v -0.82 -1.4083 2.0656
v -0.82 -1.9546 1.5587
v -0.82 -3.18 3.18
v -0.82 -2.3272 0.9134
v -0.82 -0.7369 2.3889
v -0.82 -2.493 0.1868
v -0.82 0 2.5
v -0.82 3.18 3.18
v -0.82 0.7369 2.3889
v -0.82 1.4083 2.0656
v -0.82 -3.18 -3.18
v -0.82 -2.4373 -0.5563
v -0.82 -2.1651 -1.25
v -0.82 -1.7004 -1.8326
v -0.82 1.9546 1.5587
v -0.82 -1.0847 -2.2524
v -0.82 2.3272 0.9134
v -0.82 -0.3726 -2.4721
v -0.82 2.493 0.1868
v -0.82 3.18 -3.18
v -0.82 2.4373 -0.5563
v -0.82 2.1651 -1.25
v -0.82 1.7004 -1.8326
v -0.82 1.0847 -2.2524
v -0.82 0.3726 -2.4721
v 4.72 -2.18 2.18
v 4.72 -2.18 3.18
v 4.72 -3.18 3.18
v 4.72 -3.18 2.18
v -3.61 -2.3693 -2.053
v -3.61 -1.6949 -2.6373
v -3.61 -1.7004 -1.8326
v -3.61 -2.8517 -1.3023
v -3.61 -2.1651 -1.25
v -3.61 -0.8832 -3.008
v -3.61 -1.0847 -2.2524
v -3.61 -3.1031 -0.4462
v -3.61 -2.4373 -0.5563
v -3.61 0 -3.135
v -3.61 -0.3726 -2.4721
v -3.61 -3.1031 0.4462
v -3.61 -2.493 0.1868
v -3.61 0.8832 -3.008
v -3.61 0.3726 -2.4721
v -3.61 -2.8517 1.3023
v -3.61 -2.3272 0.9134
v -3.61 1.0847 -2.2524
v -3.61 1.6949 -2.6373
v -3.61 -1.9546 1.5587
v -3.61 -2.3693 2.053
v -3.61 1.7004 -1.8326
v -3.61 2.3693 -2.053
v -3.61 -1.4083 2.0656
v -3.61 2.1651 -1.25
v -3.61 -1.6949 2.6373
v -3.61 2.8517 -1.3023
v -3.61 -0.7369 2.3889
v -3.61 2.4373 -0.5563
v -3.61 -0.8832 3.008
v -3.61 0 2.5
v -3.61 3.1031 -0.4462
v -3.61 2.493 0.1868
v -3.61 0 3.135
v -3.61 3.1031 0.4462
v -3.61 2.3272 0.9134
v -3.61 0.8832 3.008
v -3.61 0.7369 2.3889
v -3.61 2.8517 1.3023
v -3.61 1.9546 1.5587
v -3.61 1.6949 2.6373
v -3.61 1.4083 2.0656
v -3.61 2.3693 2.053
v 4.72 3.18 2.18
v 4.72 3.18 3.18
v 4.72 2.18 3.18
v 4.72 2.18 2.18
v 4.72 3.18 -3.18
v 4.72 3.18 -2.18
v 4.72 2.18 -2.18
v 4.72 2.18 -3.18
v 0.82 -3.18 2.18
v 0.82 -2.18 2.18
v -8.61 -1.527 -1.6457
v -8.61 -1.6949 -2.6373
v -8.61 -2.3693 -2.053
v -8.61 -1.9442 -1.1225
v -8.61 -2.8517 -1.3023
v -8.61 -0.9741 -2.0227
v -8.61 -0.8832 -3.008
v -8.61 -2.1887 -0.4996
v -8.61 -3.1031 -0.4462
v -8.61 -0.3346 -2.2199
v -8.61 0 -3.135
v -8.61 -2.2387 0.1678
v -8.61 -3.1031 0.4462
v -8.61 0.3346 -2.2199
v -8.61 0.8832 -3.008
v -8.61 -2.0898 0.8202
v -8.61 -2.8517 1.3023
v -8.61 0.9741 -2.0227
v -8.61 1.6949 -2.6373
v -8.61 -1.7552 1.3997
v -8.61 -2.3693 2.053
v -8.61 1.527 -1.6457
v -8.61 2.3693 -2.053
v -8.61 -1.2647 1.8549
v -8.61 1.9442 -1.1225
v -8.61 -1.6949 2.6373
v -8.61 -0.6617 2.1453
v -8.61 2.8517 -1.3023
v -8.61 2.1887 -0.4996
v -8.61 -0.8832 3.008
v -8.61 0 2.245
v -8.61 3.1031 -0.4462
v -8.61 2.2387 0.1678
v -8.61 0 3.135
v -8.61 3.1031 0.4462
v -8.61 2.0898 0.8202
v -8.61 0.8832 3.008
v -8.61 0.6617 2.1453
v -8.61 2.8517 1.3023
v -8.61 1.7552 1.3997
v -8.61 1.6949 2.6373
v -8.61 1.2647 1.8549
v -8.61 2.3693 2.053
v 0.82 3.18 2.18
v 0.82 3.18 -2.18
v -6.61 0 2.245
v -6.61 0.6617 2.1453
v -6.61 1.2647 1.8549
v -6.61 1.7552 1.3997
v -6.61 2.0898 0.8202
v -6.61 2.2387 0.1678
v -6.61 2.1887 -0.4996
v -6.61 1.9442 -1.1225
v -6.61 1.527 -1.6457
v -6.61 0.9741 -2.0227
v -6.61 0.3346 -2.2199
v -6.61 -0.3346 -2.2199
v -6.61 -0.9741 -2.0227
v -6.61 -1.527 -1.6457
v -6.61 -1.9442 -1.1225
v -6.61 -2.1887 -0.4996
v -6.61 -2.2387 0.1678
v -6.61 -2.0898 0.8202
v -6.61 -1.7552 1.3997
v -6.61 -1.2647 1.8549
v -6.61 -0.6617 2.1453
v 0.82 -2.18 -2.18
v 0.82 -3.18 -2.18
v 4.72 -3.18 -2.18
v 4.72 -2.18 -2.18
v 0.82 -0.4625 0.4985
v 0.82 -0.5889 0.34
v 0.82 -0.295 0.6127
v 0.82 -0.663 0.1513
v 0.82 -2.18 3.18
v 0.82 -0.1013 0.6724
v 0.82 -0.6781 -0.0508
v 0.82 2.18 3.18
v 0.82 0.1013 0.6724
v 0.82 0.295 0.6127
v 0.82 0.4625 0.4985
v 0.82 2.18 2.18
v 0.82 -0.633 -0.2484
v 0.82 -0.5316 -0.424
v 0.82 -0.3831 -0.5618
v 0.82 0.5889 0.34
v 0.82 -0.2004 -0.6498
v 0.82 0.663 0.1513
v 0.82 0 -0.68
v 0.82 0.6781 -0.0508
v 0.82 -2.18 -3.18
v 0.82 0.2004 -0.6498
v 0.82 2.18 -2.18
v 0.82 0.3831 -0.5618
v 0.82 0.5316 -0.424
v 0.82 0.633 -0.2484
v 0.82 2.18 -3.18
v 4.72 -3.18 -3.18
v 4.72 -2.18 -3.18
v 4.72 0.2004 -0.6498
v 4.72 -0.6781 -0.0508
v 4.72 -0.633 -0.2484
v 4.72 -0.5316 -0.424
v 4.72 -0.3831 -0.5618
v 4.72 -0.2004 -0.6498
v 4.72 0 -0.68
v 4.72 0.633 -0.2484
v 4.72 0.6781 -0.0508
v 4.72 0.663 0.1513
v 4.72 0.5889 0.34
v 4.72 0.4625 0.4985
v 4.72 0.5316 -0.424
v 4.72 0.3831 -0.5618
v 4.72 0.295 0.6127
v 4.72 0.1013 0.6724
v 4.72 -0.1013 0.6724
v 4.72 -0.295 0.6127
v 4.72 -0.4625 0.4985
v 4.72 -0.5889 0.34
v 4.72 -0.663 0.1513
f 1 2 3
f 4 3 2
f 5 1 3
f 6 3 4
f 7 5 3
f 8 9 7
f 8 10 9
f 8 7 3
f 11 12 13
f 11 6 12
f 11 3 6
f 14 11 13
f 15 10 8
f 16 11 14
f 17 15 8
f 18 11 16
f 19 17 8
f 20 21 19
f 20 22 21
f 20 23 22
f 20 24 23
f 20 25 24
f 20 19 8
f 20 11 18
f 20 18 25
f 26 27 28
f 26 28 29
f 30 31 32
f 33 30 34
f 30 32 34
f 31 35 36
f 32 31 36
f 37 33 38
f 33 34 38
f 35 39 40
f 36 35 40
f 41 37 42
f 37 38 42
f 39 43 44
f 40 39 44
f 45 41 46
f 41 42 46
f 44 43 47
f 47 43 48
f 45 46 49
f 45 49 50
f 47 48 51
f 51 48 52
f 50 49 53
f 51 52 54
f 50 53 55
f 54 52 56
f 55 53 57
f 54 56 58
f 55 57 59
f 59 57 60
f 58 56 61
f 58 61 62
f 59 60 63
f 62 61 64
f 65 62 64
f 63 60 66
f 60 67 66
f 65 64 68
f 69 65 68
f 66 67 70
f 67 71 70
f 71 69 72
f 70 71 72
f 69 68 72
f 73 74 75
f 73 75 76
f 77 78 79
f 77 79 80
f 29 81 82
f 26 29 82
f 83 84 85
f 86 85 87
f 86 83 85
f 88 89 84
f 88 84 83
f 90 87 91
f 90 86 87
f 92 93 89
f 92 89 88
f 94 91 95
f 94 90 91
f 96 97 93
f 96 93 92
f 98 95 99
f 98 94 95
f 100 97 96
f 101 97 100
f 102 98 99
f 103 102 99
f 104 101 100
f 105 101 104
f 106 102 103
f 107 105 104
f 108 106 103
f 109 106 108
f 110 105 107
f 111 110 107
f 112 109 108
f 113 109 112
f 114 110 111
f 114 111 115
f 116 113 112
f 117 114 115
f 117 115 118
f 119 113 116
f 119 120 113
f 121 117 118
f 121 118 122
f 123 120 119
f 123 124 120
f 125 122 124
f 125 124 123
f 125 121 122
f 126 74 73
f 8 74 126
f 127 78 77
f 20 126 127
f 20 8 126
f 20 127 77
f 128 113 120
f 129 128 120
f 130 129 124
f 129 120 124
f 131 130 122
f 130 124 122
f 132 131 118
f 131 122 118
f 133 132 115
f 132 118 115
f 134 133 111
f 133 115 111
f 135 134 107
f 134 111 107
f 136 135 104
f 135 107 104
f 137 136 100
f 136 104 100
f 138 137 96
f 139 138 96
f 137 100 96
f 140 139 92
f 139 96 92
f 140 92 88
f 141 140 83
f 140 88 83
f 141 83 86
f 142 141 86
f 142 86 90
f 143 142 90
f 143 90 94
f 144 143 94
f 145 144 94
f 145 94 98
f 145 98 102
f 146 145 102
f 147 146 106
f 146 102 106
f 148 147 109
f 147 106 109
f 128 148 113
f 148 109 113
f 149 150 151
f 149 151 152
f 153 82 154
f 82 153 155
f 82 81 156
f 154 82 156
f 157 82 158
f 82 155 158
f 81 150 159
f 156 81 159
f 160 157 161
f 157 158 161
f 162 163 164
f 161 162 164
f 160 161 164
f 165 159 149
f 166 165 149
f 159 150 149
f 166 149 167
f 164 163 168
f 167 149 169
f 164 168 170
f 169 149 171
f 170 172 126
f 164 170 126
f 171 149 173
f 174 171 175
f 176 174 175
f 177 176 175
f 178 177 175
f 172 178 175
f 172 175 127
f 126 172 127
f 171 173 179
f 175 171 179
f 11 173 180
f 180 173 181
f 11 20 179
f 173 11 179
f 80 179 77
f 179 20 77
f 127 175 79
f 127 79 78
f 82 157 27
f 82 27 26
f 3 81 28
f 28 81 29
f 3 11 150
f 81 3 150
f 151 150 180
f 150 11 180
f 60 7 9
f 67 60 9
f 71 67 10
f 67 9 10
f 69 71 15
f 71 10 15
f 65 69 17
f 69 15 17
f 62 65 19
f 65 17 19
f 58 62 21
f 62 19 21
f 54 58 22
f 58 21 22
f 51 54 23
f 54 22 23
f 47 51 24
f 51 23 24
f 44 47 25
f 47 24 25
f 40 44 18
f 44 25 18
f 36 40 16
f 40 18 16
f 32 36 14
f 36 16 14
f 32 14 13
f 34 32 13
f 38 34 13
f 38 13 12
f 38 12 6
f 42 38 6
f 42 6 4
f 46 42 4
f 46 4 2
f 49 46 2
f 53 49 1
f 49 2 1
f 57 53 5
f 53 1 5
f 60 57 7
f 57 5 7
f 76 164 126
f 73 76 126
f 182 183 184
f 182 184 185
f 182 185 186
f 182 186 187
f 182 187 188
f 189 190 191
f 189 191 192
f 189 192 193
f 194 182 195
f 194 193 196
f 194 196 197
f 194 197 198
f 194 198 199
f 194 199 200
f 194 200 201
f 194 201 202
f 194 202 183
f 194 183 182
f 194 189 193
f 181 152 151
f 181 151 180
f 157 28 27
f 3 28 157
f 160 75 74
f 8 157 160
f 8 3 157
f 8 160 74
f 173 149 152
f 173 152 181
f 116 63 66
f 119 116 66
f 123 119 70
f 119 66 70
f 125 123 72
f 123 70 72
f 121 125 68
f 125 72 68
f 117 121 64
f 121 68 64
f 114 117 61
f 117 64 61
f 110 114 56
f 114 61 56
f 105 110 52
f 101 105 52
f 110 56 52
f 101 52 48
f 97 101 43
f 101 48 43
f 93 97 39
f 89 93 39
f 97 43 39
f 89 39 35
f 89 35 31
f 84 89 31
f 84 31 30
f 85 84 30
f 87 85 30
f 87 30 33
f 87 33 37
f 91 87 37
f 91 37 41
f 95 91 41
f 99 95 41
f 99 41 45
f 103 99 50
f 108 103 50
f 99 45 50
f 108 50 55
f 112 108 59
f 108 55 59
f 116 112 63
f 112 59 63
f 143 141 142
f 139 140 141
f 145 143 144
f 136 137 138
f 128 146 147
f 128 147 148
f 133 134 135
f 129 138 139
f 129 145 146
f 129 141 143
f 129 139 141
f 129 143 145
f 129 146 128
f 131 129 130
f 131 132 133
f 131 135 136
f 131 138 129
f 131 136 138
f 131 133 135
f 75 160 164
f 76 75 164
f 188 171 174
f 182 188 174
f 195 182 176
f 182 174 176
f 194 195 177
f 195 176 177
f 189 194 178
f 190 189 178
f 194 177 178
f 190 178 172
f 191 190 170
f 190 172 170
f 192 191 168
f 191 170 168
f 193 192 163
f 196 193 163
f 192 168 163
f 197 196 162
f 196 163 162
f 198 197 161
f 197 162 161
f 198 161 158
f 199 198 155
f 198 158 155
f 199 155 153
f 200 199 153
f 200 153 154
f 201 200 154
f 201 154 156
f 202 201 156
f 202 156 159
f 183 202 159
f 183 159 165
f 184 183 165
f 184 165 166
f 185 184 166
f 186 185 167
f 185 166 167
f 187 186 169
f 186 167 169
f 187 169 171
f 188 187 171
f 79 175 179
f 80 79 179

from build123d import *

# Parameters (mm, degrees)
BOSS_EXTRUDE1_DEPTH      = 3.18
BOSS_EXTRUDE1_DEPTH_BACK = 3.18
SKETCH1_W                = 1.64
SKETCH1_H                = 6.36
SKETCH2_R                = 2.5
BOSS_EXTRUDE2_DEPTH      = 2.79
SKETCH3_R                = 3.135
BOSS_EXTRUDE3_DEPTH      = 5
SKETCH4_W                = 1
SKETCH4_H                = 1
BOSS_EXTRUDE4_DEPTH      = 3.9
SKETCH5_R                = 0.68
BOSS_EXTRUDE5_DEPTH      = 3.9
SKETCH6_R                = 2.245
CUT_EXTRUDE1_DEPTH       = 2


with BuildPart() as part:
    # Sketch1 → Boss-Extrude1 (new, two sides: drawn at the far end of the back side and taken through both)
    with BuildSketch(Plane.XY.offset(-BOSS_EXTRUDE1_DEPTH_BACK)):
        Rectangle(SKETCH1_W, SKETCH1_H)
    extrude(amount=BOSS_EXTRUDE1_DEPTH + BOSS_EXTRUDE1_DEPTH_BACK)

    # Sketch2 → Boss-Extrude2 (add)
    with BuildSketch(Plane.ZY.offset(0.82)):
        Circle(SKETCH2_R)
    extrude(amount=BOSS_EXTRUDE2_DEPTH)

    # Sketch3 → Boss-Extrude3 (add)
    with BuildSketch(Plane.ZY.offset(3.61)):
        Circle(SKETCH3_R)
    extrude(amount=BOSS_EXTRUDE3_DEPTH)

    # Sketch4 → Boss-Extrude4 (add)
    with BuildSketch(Plane(origin=(0.82, 0, 0), x_dir=(0, 0, -1), z_dir=(1, 0, 0))):
        with Locations((-2.68, 2.68)):
            Rectangle(SKETCH4_W, SKETCH4_H)
        with Locations((2.68, 2.68)):
            Rectangle(SKETCH4_W, SKETCH4_H)
        with Locations((-2.68, -2.68)):
            Rectangle(SKETCH4_W, SKETCH4_H)
        with Locations((2.68, -2.68)):
            Rectangle(SKETCH4_W, SKETCH4_H)
    extrude(amount=BOSS_EXTRUDE4_DEPTH)

    # Sketch5 → Boss-Extrude5 (add)
    with BuildSketch(Plane(origin=(0.82, 0, 0), x_dir=(0, 0, -1), z_dir=(1, 0, 0))):
        Circle(SKETCH5_R)
    extrude(amount=BOSS_EXTRUDE5_DEPTH)

    # Sketch6 → Cut-Extrude1 (cut)
    with BuildSketch(Plane.ZY.offset(8.61)):
        Circle(SKETCH6_R)
    extrude(amount=-CUT_EXTRUDE1_DEPTH, mode=Mode.SUBTRACT)


solid = part.part
